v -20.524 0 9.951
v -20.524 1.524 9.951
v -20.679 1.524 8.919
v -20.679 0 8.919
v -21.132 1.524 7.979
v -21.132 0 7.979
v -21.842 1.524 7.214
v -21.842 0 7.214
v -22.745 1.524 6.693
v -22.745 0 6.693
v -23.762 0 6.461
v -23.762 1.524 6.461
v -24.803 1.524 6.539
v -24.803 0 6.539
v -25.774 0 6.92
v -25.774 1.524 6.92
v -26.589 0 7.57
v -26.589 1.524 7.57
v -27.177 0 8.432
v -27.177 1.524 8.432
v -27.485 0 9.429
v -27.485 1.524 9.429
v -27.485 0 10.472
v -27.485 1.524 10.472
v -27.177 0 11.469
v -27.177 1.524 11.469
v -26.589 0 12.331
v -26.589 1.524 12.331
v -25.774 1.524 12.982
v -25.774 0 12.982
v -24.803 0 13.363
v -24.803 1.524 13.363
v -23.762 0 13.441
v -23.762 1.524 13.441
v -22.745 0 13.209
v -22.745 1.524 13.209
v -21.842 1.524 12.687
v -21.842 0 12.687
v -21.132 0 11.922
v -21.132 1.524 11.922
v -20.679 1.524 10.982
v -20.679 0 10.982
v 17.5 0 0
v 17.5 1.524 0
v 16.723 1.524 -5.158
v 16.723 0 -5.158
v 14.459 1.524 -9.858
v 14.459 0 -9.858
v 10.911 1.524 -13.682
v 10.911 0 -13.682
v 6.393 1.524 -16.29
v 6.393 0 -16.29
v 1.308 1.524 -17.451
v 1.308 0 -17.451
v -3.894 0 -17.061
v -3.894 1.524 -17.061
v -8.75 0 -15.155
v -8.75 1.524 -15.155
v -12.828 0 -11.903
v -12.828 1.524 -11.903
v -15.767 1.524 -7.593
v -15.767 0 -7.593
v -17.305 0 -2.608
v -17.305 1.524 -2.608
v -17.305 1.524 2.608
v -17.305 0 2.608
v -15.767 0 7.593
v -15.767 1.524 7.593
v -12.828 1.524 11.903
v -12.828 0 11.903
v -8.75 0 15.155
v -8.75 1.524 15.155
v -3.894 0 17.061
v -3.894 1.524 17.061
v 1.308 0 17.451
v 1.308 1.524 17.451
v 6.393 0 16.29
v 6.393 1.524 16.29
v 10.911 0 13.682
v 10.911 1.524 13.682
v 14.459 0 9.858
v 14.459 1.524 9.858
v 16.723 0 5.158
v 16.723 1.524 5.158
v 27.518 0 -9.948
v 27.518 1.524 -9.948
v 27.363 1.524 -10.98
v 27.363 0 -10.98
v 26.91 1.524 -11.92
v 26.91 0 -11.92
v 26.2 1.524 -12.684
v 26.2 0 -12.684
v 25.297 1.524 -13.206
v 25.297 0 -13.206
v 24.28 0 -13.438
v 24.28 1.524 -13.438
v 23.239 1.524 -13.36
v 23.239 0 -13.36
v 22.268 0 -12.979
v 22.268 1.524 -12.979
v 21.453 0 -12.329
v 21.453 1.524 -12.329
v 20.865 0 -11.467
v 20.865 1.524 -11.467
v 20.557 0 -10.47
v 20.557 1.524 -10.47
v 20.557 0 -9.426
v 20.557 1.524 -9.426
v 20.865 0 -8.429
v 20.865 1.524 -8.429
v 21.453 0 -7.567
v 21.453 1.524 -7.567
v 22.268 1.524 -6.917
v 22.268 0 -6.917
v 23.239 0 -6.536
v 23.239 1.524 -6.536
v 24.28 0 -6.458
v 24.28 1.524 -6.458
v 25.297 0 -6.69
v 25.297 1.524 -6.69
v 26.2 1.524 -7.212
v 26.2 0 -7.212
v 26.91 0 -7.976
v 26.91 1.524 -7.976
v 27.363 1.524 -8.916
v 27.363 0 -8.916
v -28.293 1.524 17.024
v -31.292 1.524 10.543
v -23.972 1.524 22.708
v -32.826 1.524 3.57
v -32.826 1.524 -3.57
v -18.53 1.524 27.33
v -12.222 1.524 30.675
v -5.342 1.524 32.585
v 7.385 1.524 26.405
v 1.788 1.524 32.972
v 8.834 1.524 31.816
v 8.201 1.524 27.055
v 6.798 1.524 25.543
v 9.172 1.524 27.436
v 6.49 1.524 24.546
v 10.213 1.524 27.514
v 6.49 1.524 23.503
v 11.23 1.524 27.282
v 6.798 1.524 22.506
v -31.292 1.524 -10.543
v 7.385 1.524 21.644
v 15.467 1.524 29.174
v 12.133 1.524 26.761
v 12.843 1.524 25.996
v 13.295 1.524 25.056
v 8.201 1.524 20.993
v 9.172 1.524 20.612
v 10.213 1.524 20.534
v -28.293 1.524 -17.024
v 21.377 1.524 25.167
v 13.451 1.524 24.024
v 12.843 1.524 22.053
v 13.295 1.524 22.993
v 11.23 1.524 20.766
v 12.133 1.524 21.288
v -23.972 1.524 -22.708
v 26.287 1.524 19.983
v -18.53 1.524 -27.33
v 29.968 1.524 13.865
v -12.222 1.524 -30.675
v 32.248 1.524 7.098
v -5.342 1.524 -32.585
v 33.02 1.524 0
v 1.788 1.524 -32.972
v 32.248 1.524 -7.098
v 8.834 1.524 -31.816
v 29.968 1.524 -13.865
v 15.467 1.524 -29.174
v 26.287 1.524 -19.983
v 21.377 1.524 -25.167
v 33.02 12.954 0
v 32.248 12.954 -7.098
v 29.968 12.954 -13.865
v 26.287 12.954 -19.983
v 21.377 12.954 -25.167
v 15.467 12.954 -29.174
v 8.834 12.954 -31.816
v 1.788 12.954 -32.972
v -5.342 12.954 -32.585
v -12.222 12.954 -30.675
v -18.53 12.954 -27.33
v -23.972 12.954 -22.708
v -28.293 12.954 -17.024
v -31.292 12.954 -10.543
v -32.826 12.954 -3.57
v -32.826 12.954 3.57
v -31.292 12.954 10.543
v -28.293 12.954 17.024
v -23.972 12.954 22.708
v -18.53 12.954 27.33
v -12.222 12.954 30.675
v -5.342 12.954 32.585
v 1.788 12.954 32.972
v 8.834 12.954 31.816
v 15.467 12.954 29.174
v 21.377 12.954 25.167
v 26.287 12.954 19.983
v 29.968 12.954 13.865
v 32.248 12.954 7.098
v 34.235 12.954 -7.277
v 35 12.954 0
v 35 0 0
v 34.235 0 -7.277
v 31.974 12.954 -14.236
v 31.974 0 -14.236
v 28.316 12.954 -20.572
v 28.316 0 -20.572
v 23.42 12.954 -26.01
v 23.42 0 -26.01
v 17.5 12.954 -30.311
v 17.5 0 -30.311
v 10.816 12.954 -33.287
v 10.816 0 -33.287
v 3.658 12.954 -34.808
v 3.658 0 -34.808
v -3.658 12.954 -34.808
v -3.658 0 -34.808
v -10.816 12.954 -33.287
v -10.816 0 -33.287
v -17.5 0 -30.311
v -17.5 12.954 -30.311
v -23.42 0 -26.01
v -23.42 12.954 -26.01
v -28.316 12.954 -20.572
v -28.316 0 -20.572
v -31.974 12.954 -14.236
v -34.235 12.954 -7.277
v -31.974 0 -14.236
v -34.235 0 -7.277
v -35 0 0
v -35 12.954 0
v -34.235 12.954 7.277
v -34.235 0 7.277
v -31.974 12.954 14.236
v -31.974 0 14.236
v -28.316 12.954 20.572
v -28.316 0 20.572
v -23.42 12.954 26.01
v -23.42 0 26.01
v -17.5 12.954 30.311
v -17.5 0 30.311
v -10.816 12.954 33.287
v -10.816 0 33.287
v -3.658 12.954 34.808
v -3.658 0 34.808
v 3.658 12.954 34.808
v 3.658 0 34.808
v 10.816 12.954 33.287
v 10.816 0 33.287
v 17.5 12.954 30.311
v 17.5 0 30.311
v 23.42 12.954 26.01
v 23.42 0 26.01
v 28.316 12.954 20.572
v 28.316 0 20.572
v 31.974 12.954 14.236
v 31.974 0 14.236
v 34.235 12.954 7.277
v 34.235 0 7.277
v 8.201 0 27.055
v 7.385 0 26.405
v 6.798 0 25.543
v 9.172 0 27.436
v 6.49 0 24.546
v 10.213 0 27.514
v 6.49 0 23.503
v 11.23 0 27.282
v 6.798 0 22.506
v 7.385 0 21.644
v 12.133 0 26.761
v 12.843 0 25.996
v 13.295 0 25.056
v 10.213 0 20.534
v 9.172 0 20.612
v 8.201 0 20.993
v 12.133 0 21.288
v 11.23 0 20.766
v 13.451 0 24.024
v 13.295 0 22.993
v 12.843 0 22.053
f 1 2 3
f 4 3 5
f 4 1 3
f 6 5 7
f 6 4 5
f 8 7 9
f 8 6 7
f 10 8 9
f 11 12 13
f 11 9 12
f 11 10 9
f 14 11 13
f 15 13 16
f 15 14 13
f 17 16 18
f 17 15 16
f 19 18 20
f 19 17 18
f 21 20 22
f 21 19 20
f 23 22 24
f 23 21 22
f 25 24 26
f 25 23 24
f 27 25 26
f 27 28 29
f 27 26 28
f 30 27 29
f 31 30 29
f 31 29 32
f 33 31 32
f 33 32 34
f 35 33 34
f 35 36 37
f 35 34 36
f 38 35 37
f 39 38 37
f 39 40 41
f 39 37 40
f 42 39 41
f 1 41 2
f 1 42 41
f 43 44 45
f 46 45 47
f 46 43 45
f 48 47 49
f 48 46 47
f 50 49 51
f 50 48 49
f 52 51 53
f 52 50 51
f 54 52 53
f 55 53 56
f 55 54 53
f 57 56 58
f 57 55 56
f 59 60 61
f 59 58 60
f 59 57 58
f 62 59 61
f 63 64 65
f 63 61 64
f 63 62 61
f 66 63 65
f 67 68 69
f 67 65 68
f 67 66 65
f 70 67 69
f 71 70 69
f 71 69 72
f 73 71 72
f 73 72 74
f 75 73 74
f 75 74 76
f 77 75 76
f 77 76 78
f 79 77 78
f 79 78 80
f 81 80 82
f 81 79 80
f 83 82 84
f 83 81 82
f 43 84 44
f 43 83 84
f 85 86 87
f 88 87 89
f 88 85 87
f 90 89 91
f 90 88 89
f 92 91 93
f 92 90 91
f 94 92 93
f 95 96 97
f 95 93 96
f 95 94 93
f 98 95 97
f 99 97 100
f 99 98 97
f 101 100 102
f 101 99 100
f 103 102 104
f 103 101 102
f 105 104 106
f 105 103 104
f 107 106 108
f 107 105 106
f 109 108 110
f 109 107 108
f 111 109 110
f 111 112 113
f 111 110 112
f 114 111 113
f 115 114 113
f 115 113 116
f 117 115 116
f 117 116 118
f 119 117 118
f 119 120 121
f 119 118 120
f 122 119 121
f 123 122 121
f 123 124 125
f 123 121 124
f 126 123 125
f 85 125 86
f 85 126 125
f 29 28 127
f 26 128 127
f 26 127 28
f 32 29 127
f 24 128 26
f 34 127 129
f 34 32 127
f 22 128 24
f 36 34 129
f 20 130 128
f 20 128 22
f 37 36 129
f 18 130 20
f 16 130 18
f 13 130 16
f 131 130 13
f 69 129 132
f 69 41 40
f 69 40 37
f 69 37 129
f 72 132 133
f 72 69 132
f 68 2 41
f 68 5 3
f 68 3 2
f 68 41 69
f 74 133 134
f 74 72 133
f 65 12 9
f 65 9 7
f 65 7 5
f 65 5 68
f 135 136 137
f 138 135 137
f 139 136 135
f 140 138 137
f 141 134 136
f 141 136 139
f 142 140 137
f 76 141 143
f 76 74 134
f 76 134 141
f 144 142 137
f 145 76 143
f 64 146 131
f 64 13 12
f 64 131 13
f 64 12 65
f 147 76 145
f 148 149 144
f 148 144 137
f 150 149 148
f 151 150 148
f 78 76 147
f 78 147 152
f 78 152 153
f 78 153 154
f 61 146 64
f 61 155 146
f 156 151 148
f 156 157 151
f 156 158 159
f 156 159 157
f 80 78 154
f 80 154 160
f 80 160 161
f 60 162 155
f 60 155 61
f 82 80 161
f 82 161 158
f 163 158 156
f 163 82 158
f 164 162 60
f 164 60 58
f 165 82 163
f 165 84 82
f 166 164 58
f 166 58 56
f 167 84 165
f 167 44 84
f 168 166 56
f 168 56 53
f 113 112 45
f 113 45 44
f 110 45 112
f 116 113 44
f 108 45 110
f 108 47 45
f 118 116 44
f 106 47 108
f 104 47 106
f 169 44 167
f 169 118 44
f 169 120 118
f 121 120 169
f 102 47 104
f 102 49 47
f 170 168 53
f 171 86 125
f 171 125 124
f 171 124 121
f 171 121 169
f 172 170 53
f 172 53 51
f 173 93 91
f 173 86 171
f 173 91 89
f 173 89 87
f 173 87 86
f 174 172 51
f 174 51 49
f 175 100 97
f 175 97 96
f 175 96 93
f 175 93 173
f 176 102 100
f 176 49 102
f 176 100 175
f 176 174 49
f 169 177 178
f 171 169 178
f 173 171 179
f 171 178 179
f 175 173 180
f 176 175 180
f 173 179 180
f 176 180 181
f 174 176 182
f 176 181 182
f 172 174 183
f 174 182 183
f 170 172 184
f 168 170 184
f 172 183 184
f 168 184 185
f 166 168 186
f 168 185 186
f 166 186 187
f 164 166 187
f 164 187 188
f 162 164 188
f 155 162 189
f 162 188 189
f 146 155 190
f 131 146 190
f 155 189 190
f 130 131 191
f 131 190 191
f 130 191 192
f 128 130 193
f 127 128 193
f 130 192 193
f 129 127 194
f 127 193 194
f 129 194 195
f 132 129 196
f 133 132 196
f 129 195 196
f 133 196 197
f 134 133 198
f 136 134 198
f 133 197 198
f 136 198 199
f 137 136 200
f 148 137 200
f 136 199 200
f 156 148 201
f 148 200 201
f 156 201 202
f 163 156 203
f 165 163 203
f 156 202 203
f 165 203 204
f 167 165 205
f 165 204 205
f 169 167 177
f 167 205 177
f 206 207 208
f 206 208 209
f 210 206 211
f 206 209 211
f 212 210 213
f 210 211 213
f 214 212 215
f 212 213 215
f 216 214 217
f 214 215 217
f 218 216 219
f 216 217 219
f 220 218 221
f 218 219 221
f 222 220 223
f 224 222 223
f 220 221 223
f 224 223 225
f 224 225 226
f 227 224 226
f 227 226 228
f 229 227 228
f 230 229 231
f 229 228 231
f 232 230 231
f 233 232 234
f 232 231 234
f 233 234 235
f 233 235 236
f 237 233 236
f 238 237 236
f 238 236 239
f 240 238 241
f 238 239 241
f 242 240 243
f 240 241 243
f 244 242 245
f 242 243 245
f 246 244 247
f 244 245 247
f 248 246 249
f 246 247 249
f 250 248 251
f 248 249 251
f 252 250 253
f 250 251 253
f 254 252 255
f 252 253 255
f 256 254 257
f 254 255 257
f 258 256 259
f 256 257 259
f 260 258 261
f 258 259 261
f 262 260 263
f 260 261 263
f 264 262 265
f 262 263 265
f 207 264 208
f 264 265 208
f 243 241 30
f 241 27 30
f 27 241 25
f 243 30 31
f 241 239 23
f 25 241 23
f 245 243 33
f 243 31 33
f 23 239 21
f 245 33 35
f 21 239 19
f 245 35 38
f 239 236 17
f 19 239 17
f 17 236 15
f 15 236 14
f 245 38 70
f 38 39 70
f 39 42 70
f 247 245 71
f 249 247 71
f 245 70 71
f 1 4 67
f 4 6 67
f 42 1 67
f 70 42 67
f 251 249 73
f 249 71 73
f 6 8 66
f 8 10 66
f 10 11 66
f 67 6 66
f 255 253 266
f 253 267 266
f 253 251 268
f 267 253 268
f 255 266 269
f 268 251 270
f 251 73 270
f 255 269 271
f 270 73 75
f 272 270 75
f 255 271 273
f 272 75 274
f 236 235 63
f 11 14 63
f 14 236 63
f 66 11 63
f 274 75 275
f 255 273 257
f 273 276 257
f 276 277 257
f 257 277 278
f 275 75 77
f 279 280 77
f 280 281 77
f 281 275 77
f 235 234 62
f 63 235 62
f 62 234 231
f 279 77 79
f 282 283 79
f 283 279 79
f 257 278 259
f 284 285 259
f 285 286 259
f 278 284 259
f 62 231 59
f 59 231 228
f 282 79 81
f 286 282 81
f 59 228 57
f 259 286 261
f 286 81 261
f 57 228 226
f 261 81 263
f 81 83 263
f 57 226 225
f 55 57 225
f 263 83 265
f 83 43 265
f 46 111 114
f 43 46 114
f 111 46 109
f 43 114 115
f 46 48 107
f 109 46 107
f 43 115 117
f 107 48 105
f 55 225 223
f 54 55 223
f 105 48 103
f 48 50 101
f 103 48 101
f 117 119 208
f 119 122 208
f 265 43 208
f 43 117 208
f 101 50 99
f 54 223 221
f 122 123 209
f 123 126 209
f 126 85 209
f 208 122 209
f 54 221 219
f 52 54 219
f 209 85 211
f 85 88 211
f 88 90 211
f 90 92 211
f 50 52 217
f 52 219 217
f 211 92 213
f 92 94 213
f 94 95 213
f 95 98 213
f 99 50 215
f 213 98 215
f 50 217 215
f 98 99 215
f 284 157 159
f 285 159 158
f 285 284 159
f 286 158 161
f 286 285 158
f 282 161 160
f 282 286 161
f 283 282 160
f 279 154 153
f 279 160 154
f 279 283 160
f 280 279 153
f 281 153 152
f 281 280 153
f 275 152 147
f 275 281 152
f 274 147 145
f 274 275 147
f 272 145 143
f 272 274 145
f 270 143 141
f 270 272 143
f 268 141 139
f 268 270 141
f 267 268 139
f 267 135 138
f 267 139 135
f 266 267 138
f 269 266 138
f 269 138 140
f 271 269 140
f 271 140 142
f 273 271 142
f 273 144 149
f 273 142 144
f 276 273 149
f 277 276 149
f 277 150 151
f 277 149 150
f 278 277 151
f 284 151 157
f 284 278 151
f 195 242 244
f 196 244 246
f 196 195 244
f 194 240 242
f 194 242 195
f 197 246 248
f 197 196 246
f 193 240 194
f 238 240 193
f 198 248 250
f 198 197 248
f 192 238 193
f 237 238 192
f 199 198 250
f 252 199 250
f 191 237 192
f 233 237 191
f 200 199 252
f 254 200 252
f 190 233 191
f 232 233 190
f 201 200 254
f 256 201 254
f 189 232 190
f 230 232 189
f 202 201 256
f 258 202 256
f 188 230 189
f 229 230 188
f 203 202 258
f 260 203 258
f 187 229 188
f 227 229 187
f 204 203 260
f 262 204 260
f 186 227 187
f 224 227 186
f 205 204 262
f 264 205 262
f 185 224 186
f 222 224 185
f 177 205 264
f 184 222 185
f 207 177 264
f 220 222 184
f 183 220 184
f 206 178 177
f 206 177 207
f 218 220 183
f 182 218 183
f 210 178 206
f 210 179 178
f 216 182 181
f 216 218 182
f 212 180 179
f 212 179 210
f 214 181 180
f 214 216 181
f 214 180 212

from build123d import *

# Parameters (mm, degrees)
SKETCH1_R           = 35
SKETCH1_R_2         = 17.5
SKETCH1_R_3         = 3.5
BOSS_EXTRUDE1_DEPTH = 12.954
SKETCH2_R           = 33.02
CUT_EXTRUDE1_DEPTH  = 11.43


with BuildPart() as part:
    # Sketch1 → Boss-Extrude1 (new body)
    with BuildSketch(Plane(origin=(0, 0, 0), x_dir=(1, 0, 0), z_dir=(0, 1, 0))):
        Circle(SKETCH1_R)
        Circle(SKETCH1_R_2, mode=Mode.SUBTRACT)
        with Locations((-24.023795501, -9.950801949)):
            Circle(SKETCH1_R_3, mode=Mode.SUBTRACT)
        with Locations((24.018239985, 9.948012748)):
            Circle(SKETCH1_R_3, mode=Mode.SUBTRACT)
        with Locations((9.950974523, -24.02421215)):
            Circle(SKETCH1_R_3, mode=Mode.SUBTRACT)
    extrude(amount=BOSS_EXTRUDE1_DEPTH)

    # Sketch2 → Cut-Extrude1 (cut)
    with BuildSketch(Plane(origin=(0, 12.954, 0), x_dir=(1, 0, 0), z_dir=(0, 1, 0))):
        Circle(SKETCH2_R)
    extrude(amount=-CUT_EXTRUDE1_DEPTH, mode=Mode.SUBTRACT)


solid = part.part
